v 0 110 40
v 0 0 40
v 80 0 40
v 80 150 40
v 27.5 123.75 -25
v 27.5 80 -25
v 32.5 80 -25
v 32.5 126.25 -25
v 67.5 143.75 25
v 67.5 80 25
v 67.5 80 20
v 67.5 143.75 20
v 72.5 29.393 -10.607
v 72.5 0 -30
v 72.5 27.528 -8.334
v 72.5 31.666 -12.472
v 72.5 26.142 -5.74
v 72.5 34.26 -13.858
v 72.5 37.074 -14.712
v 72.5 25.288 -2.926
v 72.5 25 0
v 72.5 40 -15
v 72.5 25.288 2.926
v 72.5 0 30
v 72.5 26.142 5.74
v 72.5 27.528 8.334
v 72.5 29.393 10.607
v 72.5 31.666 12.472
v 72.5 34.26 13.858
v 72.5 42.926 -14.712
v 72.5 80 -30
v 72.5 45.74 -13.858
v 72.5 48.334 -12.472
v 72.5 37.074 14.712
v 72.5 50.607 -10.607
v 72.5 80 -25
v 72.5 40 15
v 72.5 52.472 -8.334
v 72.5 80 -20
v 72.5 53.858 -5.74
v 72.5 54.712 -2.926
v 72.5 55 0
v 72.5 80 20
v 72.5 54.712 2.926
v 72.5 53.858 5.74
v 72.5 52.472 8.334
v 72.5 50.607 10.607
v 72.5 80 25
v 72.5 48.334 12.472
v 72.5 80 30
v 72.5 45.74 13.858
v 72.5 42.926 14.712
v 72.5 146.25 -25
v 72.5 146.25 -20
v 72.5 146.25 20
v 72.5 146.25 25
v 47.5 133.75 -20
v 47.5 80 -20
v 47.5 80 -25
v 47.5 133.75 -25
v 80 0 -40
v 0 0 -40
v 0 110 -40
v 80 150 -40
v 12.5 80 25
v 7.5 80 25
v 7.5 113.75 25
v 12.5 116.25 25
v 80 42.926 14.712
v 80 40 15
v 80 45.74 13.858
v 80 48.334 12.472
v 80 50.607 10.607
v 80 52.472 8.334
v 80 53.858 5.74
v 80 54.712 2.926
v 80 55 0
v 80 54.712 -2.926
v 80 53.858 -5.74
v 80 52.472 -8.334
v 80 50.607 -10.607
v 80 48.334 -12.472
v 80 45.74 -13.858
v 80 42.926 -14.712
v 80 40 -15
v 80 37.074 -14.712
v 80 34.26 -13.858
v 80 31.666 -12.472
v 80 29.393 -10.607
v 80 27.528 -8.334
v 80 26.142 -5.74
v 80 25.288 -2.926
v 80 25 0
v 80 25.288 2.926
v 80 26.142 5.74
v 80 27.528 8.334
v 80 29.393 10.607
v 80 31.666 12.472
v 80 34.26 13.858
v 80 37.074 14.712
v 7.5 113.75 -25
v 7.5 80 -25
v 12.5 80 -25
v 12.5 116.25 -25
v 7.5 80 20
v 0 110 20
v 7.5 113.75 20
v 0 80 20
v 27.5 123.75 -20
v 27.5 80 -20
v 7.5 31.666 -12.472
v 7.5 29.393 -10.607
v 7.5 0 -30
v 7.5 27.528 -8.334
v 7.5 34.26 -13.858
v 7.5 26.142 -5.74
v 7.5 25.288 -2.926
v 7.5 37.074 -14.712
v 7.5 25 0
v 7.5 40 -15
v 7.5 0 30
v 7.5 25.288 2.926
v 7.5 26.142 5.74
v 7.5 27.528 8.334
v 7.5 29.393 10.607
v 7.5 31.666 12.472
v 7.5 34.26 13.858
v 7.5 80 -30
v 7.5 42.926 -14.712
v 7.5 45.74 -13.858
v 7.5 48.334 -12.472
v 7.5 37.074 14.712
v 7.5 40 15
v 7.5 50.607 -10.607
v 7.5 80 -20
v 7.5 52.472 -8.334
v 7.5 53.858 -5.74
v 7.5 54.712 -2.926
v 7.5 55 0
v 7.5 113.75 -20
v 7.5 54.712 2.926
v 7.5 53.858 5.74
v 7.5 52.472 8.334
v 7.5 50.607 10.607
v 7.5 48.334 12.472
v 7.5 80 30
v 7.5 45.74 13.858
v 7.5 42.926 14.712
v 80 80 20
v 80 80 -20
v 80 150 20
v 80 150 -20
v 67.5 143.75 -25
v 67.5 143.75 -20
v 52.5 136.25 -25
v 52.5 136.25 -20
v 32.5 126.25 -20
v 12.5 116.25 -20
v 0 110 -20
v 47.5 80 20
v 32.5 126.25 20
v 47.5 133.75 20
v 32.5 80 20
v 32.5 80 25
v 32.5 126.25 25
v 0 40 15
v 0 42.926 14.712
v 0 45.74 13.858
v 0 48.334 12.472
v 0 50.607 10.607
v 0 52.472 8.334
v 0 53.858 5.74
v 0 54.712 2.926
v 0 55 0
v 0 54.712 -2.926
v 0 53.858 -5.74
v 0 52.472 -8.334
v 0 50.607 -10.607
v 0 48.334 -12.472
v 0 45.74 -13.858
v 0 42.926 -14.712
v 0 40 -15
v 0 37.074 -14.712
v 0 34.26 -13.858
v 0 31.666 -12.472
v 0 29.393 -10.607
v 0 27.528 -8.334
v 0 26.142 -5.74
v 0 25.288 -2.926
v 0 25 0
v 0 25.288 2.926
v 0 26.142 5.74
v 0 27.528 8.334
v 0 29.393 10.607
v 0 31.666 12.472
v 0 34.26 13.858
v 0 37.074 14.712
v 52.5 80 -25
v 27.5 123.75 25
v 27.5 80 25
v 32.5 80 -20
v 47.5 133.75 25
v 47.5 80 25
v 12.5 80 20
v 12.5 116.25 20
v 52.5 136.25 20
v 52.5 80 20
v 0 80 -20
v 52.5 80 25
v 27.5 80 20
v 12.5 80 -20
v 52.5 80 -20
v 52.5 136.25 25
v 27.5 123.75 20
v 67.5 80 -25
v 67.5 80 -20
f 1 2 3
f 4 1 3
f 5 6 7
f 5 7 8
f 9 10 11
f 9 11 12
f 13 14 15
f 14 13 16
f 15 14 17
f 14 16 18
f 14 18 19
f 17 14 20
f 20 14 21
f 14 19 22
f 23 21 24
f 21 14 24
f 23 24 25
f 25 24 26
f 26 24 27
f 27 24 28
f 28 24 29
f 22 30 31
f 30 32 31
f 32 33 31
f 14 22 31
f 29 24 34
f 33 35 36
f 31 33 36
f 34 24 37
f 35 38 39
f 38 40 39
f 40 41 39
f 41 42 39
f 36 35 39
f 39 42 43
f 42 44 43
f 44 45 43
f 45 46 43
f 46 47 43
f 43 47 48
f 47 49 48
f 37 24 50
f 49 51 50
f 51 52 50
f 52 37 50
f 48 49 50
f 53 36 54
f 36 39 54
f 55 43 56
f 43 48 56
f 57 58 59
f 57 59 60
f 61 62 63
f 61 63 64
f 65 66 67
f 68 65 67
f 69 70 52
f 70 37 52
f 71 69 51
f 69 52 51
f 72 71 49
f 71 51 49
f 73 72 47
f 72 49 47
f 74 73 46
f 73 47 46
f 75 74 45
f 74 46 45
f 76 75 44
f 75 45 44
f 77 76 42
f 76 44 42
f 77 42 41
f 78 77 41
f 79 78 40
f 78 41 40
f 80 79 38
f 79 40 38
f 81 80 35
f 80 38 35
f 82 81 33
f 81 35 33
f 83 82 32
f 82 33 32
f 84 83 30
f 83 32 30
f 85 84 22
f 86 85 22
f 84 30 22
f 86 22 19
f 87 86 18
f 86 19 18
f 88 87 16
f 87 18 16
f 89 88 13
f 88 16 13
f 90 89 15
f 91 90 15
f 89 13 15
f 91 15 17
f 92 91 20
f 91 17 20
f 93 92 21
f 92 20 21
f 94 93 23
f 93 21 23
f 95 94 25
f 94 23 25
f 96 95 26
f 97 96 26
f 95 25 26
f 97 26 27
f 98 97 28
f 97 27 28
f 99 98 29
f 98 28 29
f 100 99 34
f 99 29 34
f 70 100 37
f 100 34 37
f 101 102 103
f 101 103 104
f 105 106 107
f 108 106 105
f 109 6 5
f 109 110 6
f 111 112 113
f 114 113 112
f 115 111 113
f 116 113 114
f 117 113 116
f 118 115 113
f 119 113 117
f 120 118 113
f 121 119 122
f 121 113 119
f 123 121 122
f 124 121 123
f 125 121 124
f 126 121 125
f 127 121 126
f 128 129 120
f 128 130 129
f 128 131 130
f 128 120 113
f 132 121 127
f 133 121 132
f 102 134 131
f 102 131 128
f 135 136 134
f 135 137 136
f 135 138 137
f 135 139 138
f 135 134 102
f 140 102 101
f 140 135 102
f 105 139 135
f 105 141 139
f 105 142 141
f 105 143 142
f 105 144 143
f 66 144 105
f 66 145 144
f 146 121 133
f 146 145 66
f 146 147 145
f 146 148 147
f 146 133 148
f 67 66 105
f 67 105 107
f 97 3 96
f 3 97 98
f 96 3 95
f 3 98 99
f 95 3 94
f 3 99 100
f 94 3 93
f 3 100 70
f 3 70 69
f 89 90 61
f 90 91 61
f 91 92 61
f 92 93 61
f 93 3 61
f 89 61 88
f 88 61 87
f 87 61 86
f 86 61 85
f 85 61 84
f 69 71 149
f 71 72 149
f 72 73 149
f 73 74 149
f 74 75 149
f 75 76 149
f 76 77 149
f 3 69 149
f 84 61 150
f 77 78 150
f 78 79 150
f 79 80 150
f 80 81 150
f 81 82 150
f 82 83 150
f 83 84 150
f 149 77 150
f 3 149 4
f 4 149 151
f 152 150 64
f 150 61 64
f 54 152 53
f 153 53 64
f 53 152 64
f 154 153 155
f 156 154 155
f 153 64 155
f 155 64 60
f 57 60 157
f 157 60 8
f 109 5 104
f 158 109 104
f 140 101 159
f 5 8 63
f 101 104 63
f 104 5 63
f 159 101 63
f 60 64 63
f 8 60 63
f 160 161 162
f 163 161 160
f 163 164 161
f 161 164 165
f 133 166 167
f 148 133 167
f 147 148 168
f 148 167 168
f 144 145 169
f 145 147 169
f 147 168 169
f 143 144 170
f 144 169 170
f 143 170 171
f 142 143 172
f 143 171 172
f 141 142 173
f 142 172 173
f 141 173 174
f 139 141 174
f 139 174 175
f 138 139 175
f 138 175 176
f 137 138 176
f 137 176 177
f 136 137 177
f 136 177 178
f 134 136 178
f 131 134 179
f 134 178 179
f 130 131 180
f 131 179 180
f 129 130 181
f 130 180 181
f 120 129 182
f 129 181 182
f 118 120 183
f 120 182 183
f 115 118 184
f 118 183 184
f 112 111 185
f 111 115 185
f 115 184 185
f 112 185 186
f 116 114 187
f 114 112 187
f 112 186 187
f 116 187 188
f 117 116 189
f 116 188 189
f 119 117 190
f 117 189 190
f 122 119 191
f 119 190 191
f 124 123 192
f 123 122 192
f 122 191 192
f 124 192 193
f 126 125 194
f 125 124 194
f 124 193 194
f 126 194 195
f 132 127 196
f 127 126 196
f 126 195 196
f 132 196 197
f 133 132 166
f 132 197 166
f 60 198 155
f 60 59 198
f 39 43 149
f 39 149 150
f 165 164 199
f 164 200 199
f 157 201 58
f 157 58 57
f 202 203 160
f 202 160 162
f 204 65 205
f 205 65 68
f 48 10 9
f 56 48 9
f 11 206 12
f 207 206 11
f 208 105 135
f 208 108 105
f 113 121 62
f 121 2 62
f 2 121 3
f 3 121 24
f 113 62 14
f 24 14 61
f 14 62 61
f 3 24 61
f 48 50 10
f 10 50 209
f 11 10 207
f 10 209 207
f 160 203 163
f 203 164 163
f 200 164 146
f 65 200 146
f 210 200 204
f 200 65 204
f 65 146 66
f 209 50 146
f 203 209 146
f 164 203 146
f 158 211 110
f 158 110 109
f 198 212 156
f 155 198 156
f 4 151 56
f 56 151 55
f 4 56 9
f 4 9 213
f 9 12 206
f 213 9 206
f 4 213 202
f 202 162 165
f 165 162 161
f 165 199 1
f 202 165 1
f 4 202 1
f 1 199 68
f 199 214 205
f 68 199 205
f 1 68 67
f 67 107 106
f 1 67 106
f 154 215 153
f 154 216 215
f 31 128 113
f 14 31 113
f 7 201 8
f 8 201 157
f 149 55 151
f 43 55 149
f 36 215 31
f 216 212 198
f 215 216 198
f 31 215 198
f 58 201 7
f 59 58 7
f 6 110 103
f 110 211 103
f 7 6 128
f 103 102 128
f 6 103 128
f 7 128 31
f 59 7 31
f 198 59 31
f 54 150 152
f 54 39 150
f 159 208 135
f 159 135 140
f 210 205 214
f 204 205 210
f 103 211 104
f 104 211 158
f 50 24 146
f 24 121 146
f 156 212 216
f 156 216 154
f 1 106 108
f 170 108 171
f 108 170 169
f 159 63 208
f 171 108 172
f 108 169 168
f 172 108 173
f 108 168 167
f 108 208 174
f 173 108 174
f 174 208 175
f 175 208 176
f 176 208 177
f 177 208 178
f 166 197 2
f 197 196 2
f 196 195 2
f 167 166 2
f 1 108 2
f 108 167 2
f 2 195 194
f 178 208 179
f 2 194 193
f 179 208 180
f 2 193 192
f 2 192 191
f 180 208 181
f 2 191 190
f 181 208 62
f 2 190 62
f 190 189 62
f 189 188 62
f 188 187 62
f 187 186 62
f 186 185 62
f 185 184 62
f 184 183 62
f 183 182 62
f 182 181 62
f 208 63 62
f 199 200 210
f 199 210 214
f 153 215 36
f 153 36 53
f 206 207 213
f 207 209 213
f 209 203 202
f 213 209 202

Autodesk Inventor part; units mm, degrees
ref_plane "XZ Plane" through (0, 0, 0) normal (0, 1, 0) x (-1, 0, 0)
ref_plane "XY Plane" through (0, 0, 0) normal (0, 0, 1) x (1, 0, 0)
sketch "草圖1" plane through (0, 0, 0) normal (0, 0, 1) x (1, 0, 0)
  line L0 (0, 0) -> (80, 0)
  line L1 (80, 0) -> (80, 150)
  line L2 (0, 110) -> (0, 0)
  line L3 (80, 150) -> (0, 110)
  line L4 (0, 70) -> (80, 70)
  dimension "d3" = 70
  dimension "d4" = 40
  dimension "d5" = 80
  dimension "d73" = 80
extrude "擠出1" add sketch "草圖1" along normal mid plane 80
sketch "草圖5" plane through (0, 0, 40) normal (-1, 0, 0) x (0, 0, 1)
  circle A0 centre (-40, 40) radius 15
  line L0 (-80, 0) -> (0, 0) projected
  line L1 (-40, -30) -> (-40, 180) projected
  point P0 (-40, 0)
  dimension "d24" = 40
  dimension "d25" = 30
extrude "擠出5" cut sketch "草圖5" against normal through all
sketch "草圖11" plane through (0, 0, 0) normal (1, 0, 0) x (0, 1, 0)
  line L0 (150, -40) -> (150, 40) projected
  line L1 (80, -20) -> (150, -20)
  line L2 (150, -20) -> (150, 20)
  line L3 (150, 20) -> (80, 20)
  line L4 (80, 20) -> (80, -20)
  line L5 (80, -20) -> (150, 20) construction
  line L6 (150, -20) -> (80, 20) construction
  line L7 (-28, 0) -> (168, 0) projected
  line L8 (0, -40) -> (0, 40) projected
  point P0 (0, 0)
  point P1 (115, 0)
  point P2 (115, 0)
  dimension "d55" = 40
  dimension "d56" = 80
extrude "擠出11" cut sketch "草圖11" along normal through all
ref_plane "工作平面5" through (7.5, 0, 0) normal (1, 0, 0) x (0, 1, 0)
sketch "草圖12" plane through (7.5, 0, 0) normal (1, 0, 0) x (0, 1, 0)
  line L0 (0, -40) -> (0, 40) projected
  line L1 (80, -30) -> (0, -30)
  line L2 (0, -30) -> (0, 30)
  line L3 (0, 30) -> (80, 30)
  line L4 (80, 30) -> (80, -30)
  circle A0 centre (40, 0) radius 15 projected
  line L5 (80, -30) -> (0, 30) construction
  line L6 (0, -30) -> (80, 30) construction
  point P0 (0, 0)
  dimension "d60" = 60
extrude "擠出12" cut sketch "草圖12" along normal blind 65
sketch "草圖13" plane through (7.5, 0, 0) normal (1, 0, 0) x (0, 1, 0)
  line L0 (150, -40) -> (150, -20) projected
  line L1 (150, -20) -> (80, -20)
  line L2 (80, -20) -> (80, -25)
  line L3 (80, -25) -> (150, -25)
  line L4 (150, -25) -> (150, -20)
  line L5 (0, 0) -> (140, 0) construction
  line L6 (150, 40) -> (150, 20)
  line L7 (150, 20) -> (80, 20)
  line L8 (80, 25) -> (150, 25)
  line L9 (150, 25) -> (150, 20)
  line L10 (80, 20) -> (80, -20) projected
  line L11 (80, -20) -> (80, 20) projected
  line L12 (80, 20) -> (80, 25)
  dimension "d72" = 5
extrude "擠出13" cut sketch "草圖13" along normal blind 5
pattern_linear "矩形陣列3" count 4 spacing 20 along (1, 0, 0) of "擠出13"
properties part number "架"
